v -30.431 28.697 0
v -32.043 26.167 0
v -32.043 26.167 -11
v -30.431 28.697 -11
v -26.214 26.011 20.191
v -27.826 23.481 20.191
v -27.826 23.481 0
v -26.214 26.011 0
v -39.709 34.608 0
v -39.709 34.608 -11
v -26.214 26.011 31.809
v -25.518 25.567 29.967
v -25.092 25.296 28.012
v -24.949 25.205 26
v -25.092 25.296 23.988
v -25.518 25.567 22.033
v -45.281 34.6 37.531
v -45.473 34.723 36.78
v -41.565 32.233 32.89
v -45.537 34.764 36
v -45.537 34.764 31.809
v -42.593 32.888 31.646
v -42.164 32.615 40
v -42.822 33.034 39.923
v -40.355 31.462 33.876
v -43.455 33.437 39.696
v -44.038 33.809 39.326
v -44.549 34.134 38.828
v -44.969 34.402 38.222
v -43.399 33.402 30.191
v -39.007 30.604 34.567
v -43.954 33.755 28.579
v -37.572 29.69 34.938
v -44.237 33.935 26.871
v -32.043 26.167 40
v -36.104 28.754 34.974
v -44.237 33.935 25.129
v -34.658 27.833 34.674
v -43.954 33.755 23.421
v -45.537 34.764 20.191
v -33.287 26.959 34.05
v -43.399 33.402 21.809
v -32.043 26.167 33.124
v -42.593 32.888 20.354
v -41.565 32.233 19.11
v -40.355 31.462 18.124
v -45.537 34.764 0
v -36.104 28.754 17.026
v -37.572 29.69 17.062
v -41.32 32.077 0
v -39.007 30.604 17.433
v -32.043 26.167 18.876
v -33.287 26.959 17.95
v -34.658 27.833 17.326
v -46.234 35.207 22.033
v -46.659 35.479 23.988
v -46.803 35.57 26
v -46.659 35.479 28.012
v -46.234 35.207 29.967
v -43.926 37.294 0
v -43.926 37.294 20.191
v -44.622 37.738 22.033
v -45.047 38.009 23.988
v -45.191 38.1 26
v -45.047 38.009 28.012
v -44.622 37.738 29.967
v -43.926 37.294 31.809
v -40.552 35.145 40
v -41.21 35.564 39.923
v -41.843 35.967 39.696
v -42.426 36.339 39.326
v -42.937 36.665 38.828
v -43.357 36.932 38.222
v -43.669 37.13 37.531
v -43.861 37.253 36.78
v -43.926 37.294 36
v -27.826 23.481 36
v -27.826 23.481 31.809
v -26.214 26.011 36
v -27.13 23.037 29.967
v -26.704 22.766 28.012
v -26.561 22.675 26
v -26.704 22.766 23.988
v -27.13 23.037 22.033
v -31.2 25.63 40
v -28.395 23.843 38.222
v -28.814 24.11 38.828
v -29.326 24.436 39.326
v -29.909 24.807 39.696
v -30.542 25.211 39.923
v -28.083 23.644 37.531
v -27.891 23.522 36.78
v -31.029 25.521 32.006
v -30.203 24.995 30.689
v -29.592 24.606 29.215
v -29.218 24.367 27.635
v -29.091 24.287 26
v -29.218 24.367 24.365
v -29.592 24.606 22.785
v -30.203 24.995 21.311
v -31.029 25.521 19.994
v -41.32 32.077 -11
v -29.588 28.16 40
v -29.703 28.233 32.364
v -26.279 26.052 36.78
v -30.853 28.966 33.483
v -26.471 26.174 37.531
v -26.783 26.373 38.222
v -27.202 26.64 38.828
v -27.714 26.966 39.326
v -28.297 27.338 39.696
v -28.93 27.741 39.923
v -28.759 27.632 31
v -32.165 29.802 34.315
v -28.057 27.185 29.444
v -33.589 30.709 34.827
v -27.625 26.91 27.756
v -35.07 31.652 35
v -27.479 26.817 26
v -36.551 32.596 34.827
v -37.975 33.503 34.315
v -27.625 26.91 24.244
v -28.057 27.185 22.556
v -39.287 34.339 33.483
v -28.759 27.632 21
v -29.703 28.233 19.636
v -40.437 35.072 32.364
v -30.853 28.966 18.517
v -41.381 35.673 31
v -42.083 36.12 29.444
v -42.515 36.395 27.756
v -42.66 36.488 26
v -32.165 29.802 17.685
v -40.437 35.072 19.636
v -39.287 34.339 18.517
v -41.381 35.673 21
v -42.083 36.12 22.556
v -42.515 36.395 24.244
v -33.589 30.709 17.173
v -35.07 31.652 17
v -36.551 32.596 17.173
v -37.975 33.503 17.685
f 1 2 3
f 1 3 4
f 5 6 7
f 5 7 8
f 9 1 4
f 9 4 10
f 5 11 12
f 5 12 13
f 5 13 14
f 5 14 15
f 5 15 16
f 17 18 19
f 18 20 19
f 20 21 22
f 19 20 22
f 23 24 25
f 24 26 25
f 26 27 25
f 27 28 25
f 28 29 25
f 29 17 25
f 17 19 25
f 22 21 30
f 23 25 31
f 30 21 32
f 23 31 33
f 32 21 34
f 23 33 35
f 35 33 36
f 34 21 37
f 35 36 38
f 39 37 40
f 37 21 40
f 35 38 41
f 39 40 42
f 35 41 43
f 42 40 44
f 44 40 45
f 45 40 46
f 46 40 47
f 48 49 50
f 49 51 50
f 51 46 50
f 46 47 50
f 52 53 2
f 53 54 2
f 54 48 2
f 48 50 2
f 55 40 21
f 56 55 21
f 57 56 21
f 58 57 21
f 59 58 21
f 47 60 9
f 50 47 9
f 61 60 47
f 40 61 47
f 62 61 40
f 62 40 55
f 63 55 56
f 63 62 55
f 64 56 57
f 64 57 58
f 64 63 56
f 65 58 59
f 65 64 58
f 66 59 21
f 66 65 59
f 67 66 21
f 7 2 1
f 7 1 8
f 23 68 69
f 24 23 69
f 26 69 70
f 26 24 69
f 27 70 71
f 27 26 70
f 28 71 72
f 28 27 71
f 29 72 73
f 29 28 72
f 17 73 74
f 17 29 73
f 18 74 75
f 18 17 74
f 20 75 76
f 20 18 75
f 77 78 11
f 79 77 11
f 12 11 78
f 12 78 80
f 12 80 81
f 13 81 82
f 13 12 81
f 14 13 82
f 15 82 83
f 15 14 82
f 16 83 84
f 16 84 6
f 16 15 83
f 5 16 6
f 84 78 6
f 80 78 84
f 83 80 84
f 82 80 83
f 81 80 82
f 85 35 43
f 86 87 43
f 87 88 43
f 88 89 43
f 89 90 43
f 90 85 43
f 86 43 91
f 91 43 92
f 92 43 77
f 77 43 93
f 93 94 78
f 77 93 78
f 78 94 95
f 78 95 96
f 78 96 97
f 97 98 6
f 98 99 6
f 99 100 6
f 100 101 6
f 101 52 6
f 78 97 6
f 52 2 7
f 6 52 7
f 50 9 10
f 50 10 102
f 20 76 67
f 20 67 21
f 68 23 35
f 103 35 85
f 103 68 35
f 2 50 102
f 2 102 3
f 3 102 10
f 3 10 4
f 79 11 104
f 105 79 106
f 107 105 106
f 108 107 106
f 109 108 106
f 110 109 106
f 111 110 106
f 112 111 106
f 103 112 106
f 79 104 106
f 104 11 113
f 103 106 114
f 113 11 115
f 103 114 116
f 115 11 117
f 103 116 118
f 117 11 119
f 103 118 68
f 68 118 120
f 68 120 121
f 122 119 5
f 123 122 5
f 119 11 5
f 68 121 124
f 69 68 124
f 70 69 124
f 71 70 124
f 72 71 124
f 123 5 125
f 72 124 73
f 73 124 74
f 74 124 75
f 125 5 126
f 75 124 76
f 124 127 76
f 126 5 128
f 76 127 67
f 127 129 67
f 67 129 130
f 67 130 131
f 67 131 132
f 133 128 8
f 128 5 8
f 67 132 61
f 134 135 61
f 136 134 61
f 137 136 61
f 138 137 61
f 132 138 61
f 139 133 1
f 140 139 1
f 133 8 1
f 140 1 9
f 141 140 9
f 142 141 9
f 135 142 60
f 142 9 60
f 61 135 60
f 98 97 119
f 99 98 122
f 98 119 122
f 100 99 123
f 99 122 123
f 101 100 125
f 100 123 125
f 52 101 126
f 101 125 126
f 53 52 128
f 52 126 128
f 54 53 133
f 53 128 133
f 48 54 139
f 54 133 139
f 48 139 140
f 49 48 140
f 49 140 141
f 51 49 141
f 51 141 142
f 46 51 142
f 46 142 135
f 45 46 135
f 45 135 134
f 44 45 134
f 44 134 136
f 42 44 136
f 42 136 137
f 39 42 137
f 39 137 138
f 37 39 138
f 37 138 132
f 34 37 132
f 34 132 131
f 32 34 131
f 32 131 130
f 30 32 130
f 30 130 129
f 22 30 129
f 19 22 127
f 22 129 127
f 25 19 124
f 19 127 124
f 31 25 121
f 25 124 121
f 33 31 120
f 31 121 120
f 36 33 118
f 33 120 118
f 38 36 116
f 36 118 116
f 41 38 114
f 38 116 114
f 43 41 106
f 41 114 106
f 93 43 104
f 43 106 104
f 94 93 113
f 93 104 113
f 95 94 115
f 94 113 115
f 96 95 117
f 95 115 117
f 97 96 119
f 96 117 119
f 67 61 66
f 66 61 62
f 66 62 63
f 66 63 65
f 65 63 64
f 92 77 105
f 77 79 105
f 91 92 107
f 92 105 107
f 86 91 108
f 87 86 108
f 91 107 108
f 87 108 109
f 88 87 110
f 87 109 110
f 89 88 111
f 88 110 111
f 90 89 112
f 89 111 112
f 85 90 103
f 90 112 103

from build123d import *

# Parameters (mm, degrees)
SALIENTE_EXTRUIR1_DEPTH = 11
SALIENTE_EXTRUIR2_DEPTH = 40
CROQUIS3_R              = 12
CROQUIS3_R_2            = 9
SALIENTE_EXTRUIR3_DEPTH = 3
CROQUIS3_2_R            = 9
CORTAR_EXTRUIR1_DEPTH   = 10
REDONDEO1_R             = 4


with BuildPart() as part:
    # Croquis1 → Saliente-Extruir1 (new body)
    with BuildSketch(Plane.XY):
        Polygon((-32.04318068, 26.167112062), (-30.431281855, 28.697286399), (-39.708587759, 34.607582091), (-41.320486584, 32.077407754), align=None)
    extrude(amount=-SALIENTE_EXTRUIR1_DEPTH)

    # Croquis2 → Saliente-Extruir2 (add)
    with BuildSketch(Plane.XY):
        Polygon((-26.214324626, 26.010788357), (-43.925544988, 37.294080133), (-45.537443813, 34.763905795), (-32.04318068, 26.167112062), (-27.826223451, 23.48061402), align=None)
    extrude(amount=SALIENTE_EXTRUIR2_DEPTH)

    # Croquis3 → Saliente-Extruir3 (add)
    with BuildSketch(Plane(origin=(4.219053857, 6.622587989, 0), x_dir=(0.843391446, -0.537299608, 0), z_dir=(0.537299608, 0.843391446, 0))):
        with Locations((-46.584523545, -26)):
            Circle(CROQUIS3_R)
        with Locations((-46.584523545, -26)):
            Circle(CROQUIS3_R_2, mode=Mode.SUBTRACT)
    extrude(amount=-SALIENTE_EXTRUIR3_DEPTH)

    # Croquis3<2> → Cortar-Extruir1 (cut)
    with BuildSketch(Plane(origin=(4.219053857, 6.622587989, 0), x_dir=(0.843391446, -0.537299608, 0), z_dir=(0.537299608, 0.843391446, 0))):
        with Locations((-46.584523545, -26)):
            Circle(CROQUIS3_2_R)
    extrude(amount=-CORTAR_EXTRUIR1_DEPTH, mode=Mode.SUBTRACT)

    # Redondeo1
    redondeo1_edges = [part.edges().sort_by_distance(p)[0] for p in [
        (-27.020274039, 24.745701189, 40),
        (-44.731494401, 36.028992964, 40),
    ]]
    fillet(redondeo1_edges, radius=REDONDEO1_R)


solid = part.part
